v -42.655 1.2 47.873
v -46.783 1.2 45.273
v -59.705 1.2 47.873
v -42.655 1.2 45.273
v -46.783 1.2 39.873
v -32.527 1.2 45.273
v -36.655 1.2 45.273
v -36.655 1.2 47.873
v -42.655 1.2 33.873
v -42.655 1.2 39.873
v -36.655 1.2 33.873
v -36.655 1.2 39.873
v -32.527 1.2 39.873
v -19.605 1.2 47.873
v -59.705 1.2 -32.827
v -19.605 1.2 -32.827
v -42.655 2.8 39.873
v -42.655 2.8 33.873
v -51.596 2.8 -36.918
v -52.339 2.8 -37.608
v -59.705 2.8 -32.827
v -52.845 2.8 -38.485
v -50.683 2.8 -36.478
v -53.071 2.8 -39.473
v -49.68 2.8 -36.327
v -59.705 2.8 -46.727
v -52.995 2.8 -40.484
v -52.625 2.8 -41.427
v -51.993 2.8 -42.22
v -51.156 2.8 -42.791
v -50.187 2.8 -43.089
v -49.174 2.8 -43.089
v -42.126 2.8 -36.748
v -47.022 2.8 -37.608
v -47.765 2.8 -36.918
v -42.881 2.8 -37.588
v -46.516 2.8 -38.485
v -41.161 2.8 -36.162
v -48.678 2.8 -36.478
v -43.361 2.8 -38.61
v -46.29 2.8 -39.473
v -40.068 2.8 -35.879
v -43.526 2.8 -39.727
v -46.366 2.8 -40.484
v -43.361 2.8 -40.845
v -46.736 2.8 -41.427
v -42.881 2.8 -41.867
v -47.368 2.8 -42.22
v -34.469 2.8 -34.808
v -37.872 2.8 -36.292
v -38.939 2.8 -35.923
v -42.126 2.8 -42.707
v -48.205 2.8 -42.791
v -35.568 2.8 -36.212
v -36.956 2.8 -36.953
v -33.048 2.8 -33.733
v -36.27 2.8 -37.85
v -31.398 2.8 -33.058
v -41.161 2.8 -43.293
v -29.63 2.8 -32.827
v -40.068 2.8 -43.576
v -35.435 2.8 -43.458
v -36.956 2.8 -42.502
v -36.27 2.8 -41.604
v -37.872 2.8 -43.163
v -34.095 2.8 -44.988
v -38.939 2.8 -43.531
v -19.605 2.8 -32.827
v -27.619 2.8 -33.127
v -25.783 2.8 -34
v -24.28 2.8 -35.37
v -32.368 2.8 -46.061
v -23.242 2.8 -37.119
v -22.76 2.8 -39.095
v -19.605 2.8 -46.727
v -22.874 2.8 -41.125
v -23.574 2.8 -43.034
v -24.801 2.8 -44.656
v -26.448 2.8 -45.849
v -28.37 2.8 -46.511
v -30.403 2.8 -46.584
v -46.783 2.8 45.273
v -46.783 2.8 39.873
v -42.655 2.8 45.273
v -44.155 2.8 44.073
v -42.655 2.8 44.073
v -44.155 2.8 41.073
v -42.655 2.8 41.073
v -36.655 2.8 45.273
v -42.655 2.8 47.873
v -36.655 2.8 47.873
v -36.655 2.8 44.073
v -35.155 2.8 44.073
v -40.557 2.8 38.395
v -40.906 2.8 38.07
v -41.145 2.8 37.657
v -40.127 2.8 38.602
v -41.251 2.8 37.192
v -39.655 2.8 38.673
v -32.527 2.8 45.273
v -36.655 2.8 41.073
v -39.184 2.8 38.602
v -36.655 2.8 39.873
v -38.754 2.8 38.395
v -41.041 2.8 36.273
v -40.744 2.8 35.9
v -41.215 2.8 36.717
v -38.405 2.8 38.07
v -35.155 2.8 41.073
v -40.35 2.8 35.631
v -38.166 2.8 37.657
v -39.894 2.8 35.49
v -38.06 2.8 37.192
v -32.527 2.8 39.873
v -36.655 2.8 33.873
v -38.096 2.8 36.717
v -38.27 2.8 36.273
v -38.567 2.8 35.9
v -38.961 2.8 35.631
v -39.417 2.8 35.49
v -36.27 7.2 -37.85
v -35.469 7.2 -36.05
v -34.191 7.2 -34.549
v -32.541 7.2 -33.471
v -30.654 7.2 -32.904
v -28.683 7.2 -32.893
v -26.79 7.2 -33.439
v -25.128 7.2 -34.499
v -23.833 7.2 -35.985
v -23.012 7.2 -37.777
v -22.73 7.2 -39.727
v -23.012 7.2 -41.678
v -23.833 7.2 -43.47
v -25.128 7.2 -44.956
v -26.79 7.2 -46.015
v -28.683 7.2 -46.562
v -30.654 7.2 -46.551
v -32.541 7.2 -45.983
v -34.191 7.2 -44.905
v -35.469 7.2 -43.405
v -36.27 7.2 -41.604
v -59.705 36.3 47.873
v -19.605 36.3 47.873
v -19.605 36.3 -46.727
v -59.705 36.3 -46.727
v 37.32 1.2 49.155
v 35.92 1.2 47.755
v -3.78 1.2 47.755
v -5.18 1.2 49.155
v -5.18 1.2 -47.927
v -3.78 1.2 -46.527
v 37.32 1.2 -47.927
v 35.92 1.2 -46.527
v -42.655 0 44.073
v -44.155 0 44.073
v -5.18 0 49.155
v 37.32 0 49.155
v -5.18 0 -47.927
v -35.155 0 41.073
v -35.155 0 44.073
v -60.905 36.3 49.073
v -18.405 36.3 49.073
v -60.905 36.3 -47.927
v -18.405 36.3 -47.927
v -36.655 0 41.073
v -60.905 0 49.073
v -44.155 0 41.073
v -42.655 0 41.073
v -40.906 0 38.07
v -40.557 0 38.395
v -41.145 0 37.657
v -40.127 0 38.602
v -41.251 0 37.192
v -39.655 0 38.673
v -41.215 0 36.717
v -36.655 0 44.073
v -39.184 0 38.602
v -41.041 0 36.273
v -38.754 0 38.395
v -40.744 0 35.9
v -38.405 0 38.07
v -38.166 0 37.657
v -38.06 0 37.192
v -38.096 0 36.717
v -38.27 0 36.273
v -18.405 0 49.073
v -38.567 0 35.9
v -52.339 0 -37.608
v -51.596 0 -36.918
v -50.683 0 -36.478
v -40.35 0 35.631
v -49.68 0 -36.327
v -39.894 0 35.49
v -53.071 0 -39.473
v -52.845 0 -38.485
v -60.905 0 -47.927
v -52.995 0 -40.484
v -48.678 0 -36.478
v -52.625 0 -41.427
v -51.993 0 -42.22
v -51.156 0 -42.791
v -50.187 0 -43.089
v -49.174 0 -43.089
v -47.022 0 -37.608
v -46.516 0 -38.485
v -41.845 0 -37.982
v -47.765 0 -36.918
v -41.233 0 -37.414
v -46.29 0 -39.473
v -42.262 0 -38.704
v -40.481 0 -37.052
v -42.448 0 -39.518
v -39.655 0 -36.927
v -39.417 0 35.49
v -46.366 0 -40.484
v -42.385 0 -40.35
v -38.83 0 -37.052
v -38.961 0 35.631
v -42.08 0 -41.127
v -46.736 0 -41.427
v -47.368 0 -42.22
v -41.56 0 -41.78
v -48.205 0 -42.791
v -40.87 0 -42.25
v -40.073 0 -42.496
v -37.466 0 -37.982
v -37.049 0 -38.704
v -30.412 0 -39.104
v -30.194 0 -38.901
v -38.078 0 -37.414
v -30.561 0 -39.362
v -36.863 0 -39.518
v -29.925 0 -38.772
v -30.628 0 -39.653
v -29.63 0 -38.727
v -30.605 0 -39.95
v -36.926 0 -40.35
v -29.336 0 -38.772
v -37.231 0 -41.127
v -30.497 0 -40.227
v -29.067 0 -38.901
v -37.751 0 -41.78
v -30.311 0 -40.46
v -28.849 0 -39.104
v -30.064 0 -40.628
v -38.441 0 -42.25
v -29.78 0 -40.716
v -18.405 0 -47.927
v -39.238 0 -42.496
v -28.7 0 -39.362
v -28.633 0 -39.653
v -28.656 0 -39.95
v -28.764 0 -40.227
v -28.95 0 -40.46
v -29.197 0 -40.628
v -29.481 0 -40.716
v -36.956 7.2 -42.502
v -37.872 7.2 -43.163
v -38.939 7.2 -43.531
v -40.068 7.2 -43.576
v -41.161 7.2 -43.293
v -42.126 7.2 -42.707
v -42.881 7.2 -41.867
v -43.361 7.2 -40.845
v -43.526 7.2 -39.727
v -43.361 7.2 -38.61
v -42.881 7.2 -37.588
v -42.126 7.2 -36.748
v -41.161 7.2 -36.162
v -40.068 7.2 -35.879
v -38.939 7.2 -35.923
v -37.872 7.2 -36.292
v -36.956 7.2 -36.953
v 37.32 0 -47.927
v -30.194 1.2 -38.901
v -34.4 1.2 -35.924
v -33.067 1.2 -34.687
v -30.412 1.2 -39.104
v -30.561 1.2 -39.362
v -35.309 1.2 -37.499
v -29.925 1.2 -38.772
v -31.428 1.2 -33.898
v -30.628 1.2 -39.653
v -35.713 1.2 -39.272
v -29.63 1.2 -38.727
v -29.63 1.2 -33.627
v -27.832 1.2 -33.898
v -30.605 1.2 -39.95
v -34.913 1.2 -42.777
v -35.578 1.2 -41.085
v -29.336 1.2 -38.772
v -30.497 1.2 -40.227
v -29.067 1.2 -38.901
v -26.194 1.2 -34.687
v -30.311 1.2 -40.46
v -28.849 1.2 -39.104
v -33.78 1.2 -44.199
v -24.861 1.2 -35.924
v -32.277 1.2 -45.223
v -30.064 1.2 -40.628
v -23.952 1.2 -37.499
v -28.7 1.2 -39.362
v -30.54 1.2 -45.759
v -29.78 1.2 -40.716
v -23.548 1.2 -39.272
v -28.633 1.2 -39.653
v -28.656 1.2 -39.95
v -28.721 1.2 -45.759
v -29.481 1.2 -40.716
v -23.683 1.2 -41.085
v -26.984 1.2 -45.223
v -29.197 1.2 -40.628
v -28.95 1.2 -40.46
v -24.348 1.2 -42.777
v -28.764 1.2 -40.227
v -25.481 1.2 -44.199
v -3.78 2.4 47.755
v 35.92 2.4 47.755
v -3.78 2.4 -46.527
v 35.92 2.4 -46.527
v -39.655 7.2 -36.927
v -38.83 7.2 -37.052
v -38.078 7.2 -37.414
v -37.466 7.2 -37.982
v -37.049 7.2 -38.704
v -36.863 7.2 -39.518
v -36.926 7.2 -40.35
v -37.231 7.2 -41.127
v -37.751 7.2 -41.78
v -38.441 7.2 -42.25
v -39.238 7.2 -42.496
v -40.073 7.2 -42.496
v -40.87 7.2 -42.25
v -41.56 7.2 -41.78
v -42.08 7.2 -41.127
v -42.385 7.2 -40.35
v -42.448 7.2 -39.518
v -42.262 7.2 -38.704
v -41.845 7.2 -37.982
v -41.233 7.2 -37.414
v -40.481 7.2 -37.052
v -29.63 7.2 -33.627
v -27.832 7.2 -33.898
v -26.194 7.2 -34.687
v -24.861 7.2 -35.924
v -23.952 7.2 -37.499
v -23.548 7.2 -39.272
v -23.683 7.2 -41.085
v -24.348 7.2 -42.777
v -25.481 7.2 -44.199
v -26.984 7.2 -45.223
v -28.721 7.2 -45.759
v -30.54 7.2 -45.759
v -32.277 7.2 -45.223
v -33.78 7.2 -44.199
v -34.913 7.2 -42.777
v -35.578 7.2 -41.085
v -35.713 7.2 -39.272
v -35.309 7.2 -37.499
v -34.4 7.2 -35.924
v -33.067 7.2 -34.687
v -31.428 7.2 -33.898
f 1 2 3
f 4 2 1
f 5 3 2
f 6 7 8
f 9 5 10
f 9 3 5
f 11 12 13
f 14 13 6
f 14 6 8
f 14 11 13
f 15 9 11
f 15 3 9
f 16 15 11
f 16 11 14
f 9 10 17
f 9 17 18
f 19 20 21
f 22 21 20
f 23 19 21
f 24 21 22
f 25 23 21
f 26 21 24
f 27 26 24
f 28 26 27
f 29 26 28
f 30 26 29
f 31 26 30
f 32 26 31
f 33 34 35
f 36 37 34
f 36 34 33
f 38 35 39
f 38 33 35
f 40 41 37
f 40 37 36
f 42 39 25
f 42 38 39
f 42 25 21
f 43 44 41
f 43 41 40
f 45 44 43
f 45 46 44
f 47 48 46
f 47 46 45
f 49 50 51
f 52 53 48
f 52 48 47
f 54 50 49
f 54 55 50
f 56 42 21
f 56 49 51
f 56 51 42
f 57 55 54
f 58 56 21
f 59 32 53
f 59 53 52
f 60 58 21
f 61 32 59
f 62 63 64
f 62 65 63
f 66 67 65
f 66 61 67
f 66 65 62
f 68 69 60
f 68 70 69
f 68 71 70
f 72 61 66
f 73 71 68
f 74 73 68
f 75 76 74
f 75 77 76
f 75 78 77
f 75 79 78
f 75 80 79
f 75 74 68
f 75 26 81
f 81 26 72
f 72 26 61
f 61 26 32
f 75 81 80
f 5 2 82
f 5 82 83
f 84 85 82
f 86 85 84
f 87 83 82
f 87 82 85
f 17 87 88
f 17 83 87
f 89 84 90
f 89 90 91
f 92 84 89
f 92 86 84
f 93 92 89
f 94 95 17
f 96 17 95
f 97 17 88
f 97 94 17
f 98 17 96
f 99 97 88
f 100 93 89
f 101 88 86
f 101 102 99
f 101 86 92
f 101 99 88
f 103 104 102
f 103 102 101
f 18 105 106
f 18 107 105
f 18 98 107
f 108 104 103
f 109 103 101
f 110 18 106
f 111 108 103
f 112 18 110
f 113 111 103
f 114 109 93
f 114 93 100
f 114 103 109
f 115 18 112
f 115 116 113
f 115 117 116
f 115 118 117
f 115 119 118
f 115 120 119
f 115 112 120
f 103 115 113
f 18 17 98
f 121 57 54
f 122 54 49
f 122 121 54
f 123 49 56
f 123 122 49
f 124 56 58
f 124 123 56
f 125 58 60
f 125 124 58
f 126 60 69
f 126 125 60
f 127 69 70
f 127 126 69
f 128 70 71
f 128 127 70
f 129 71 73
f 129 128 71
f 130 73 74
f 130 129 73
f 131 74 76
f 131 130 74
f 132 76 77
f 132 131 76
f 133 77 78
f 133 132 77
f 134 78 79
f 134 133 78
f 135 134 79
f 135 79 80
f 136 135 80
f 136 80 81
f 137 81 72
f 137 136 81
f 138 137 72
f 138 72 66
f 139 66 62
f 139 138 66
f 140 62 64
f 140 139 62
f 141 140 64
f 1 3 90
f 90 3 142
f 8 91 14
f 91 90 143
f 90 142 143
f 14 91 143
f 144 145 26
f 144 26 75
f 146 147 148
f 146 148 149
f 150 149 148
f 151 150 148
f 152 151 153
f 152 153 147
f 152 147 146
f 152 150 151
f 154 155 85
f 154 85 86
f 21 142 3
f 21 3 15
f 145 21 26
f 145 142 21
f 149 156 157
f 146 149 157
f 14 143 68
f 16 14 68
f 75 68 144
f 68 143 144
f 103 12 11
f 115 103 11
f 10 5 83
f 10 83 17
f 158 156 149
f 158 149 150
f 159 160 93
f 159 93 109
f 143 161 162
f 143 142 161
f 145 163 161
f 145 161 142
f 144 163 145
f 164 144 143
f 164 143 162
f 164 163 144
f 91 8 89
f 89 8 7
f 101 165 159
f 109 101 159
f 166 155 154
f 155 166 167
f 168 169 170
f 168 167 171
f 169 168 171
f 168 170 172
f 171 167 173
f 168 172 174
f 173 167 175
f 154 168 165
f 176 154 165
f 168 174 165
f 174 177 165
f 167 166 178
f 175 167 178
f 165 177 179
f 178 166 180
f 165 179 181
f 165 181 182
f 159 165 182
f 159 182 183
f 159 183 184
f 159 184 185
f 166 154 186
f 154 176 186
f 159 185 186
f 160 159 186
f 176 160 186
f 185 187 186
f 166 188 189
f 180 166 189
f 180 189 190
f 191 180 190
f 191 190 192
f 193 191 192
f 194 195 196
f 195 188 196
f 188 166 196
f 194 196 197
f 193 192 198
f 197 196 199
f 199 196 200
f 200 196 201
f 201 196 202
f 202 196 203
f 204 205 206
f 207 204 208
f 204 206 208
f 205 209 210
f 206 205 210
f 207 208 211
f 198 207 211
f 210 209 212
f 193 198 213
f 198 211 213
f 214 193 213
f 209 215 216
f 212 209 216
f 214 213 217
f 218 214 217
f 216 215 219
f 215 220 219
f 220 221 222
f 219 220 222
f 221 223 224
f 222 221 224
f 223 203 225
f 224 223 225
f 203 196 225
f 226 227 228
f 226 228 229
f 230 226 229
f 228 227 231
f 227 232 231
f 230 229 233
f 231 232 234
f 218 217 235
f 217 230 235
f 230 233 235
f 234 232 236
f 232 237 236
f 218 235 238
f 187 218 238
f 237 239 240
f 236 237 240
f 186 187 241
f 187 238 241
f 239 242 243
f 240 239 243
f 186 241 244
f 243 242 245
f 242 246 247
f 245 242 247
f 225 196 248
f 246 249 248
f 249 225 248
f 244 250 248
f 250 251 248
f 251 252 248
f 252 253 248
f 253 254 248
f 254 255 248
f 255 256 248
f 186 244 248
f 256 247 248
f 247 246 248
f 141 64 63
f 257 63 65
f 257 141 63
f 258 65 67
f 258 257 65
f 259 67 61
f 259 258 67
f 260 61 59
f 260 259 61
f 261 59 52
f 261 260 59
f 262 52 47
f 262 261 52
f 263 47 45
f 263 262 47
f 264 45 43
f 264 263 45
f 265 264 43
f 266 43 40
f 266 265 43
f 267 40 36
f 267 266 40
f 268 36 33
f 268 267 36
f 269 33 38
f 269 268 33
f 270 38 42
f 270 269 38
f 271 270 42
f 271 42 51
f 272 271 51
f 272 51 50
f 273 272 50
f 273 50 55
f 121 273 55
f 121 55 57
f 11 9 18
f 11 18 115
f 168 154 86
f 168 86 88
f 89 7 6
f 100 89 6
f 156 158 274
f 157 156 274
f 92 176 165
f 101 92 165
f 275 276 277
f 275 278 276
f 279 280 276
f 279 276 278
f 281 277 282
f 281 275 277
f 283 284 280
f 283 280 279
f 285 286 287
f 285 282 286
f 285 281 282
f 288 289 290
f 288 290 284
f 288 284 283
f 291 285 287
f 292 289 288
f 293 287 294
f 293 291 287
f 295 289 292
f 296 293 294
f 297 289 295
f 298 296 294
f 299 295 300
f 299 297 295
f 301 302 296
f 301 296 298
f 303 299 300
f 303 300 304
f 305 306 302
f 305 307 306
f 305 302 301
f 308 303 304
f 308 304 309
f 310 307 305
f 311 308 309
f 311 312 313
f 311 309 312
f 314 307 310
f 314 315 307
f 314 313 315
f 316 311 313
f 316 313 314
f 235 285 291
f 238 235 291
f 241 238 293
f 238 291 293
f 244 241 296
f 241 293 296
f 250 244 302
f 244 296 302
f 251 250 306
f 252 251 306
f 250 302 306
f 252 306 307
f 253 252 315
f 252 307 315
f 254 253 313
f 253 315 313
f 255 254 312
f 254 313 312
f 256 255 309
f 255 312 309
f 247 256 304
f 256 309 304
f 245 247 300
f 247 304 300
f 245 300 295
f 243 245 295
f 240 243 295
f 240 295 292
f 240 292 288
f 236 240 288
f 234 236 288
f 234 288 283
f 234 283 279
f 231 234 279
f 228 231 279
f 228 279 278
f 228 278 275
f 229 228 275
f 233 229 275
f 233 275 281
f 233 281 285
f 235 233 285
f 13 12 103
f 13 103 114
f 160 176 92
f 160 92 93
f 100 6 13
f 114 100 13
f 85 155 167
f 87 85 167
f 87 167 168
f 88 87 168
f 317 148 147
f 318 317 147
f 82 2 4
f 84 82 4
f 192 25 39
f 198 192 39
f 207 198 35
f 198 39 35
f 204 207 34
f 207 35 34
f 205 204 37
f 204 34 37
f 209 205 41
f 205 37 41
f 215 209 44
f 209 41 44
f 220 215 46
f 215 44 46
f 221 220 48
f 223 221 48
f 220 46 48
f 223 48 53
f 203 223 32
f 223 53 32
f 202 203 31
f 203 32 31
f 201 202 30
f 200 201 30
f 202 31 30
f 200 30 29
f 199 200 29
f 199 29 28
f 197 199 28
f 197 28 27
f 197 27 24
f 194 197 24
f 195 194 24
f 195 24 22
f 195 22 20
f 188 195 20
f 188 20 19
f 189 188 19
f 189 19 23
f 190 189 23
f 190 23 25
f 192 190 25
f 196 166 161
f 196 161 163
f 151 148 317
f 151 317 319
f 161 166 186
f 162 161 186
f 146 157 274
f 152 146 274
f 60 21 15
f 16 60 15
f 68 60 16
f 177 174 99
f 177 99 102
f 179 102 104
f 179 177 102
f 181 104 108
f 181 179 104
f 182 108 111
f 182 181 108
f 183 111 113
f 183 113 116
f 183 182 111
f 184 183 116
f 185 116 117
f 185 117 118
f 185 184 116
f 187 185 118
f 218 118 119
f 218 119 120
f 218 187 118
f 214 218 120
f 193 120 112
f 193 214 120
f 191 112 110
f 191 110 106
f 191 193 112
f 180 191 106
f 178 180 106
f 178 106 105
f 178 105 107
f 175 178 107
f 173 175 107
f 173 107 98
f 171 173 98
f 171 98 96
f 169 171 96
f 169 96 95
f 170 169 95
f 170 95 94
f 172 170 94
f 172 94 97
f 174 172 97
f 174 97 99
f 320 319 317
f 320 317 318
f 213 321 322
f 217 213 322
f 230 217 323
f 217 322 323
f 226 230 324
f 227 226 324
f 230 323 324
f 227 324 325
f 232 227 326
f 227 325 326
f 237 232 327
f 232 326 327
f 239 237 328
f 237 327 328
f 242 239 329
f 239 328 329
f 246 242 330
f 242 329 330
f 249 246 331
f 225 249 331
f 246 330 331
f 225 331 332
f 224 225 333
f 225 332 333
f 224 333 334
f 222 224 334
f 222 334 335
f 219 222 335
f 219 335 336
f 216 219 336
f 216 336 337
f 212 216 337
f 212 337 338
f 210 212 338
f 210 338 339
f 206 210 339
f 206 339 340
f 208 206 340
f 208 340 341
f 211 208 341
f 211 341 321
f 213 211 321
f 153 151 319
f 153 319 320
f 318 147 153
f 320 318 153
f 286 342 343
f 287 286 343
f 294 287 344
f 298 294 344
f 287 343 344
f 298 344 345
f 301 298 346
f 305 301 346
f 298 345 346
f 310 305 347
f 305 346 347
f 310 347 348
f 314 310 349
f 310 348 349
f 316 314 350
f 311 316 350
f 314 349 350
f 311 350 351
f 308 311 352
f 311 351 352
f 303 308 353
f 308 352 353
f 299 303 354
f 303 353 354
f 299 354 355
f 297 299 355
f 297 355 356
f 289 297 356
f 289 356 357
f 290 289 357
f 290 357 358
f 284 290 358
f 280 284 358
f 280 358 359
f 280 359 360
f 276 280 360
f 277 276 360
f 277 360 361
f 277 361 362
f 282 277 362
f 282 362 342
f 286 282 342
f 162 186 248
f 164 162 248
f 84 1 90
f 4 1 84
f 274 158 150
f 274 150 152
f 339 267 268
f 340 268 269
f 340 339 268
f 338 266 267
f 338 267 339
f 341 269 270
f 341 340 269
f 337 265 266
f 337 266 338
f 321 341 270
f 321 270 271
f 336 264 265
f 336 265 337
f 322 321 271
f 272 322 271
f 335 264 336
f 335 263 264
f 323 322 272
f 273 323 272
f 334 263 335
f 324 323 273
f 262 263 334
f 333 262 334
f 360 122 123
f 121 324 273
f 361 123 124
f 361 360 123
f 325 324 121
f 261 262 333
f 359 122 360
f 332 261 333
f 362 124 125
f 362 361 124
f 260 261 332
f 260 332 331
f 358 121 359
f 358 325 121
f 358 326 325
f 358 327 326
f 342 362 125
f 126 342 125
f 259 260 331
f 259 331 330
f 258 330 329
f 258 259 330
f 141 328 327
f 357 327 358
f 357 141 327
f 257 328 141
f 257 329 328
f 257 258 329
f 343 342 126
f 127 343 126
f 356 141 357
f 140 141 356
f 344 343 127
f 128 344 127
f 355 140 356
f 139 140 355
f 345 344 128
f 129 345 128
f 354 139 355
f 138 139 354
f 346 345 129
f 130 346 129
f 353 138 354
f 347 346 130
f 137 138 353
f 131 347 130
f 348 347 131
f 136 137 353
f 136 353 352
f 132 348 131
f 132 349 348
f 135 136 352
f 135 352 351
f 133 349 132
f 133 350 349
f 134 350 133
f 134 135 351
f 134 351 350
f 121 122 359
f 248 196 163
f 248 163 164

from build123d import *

# Parameters (mm, degrees)
ESBO_O1_W                 = 42.5
ESBO_O1_H                 = 97
RESSALTO_EXTRUS_O2_DEPTH  = 36.3
ESBO_O2_W                 = 40.1
ESBO_O2_H                 = 94.6
CORTE_EXTRUS_O1_DEPTH     = 35.1
ESBO_O3_R                 = 3.4
ESBO_O3_R_2               = 1
ESBO_O3_R_3               = 2.8
CORTE_EXTRUS_O2_DEPTH     = 86.729869764
RESSALTO_EXTRUS_O6_START  = 1.6
ESBO_O5_W                 = 40.1
ESBO_O5_H                 = 13.9
ESBO_O5_R                 = 3.4
ESBO_O5_R_2               = 3.870741489
ESBO_O5_R_3               = 6.1
RESSALTO_EXTRUS_O6_DEPTH  = 1.6
RESSALTO_EXTRUS_O8_START  = 6
ESBO_O5_7_R               = 3.870741489
ESBO_O5_7_R_2             = 2.8
ESBO_O5_7_R_3             = 6.9
ESBO_O5_7_R_4             = 6.1
RESSALTO_EXTRUS_O8_DEPTH  = 6
ESBO_O6_W                 = 42.5
ESBO_O6_H                 = 97.082250683
RESSALTO_EXTRUS_O11_DEPTH = 1.2
ESBO_O6_4_W               = 39.7
ESBO_O6_4_H               = 94.282250683
RESSALTO_EXTRUS_O12_DEPTH = 1.2
ESBO_O6_5_W               = 39.7
ESBO_O6_5_H               = 94.282250683
RESSALTO_EXTRUS_O13_DEPTH = 2.4
ESBO_O1_8_R               = 1.6
ESBO_O1_8_W               = 1.5
ESBO_O1_8_H               = 3
CORTE_EXTRUS_O10_DEPTH    = 87.274966516
ESBO_O1_10_W              = 14.256
ESBO_O1_10_H              = 5.4
ESBO_O1_10_W_2            = 1.5
ESBO_O1_10_H_2            = 3
ESBO_O1_10_W_3            = 6
ESBO_O1_10_H_3            = 15.2
ESBO_O1_10_R              = 1.6
RESSALTO_EXTRUS_O14_DEPTH = 2.8


with BuildPart() as part:
    # Esboço1 → Ressalto-extrusão2 (new body)
    with BuildSketch(Plane(origin=(0, 0, 0), x_dir=(1, 0, 0), z_dir=(0, 1, 0))):
        with Locations((-39.655491882, -0.572615871)):
            Rectangle(ESBO_O1_W, ESBO_O1_H)
    extrude(amount=RESSALTO_EXTRUS_O2_DEPTH)

    # Esboço2 → Corte-extrusão1 (cut)
    with BuildSketch(Plane(origin=(0, 36.3, 0), x_dir=(1, 0, 0), z_dir=(0, 1, 0))):
        with Locations((-39.655491882, -0.572615871)):
            Rectangle(ESBO_O2_W, ESBO_O2_H)
    extrude(amount=-CORTE_EXTRUS_O1_DEPTH, mode=Mode.SUBTRACT)

    # Esboço3 → Corte-extrusão2 (cut, through all)
    with BuildSketch(Plane(origin=(0, 1.2, 0), x_dir=(1, 0, 0), z_dir=(0, 1, 0))):
        with Locations((-49.680491882, 39.727384129)):
            Circle(ESBO_O3_R)
        with Locations((-29.630491882, 39.727384129)):
            Circle(ESBO_O3_R_2)
        with Locations((-39.655491882, 39.727384129)):
            Circle(ESBO_O3_R_3)
    extrude(amount=-CORTE_EXTRUS_O2_DEPTH, mode=Mode.SUBTRACT)

    # Esboço5 → Ressalto-extrusão6 (add)
    with BuildSketch(Plane(origin=(0, 1.2, 0), x_dir=(1, 0, 0), z_dir=(0, 1, 0)).offset(RESSALTO_EXTRUS_O6_START)):
        with Locations((-39.655491882, 39.777384129)):
            Rectangle(ESBO_O5_W, ESBO_O5_H)
        with Locations((-49.680491882, 39.727384129)):
            Circle(ESBO_O5_R, mode=Mode.SUBTRACT)
        with Locations((-39.655491882, 39.727384129)):
            Circle(ESBO_O5_R_2, mode=Mode.SUBTRACT)
        with Locations((-29.630491882, 39.727384129)):
            Circle(ESBO_O5_R_3, mode=Mode.SUBTRACT)
    extrude(amount=-RESSALTO_EXTRUS_O6_DEPTH)

    # Esboço5<7> → Ressalto-extrusão8 (add)
    # profile 1 of 2: a face of its own
    with BuildSketch(Plane(origin=(0, 1.2, 0), x_dir=(1, 0, 0), z_dir=(0, 1, 0)).offset(RESSALTO_EXTRUS_O8_START)):
        with Locations((-39.655491882, 39.727384129)):
            Circle(ESBO_O5_7_R)
        with Locations((-39.655491882, 39.727384129)):
            Circle(ESBO_O5_7_R_2, mode=Mode.SUBTRACT)
    # profile 2 of 2: a face of its own
    with BuildSketch(Plane(origin=(0, 1.2, 0), x_dir=(1, 0, 0), z_dir=(0, 1, 0)).offset(RESSALTO_EXTRUS_O8_START)):
        with Locations((-29.630491882, 39.727384129)):
            Circle(ESBO_O5_7_R_3)
        with Locations((-29.630491882, 39.727384129)):
            Circle(ESBO_O5_7_R_4, mode=Mode.SUBTRACT)
    extrude(amount=-RESSALTO_EXTRUS_O8_DEPTH)

    # Esboço1<8> → Corte-extrusão10 (cut, through all)
    with BuildSketch(Plane(origin=(0, 0, 0), x_dir=(1, 0, 0), z_dir=(0, 1, 0))):
        with Locations((-39.655491882, -37.072615871)):
            Circle(ESBO_O1_8_R)
        with Locations((-43.405491882, -42.572615871)):
            Rectangle(ESBO_O1_8_W, ESBO_O1_8_H)
        with Locations((-35.905491882, -42.572615871)):
            Rectangle(ESBO_O1_8_W, ESBO_O1_8_H)
    extrude(amount=CORTE_EXTRUS_O10_DEPTH, mode=Mode.SUBTRACT)

    # Esboço1<10> → Ressalto-extrusão14 (add)
    # profile 1 of 2: a face of its own
    with BuildSketch(Plane(origin=(0, 0, 0), x_dir=(1, 0, 0), z_dir=(0, 1, 0))):
        with Locations((-39.655491882, -42.572615871)):
            Rectangle(ESBO_O1_10_W, ESBO_O1_10_H)
        with Locations((-43.405491882, -42.572615871)):
            Rectangle(ESBO_O1_10_W_2, ESBO_O1_10_H_2, mode=Mode.SUBTRACT)
        with Locations((-35.905491882, -42.572615871)):
            Rectangle(ESBO_O1_10_W_2, ESBO_O1_10_H_2, mode=Mode.SUBTRACT)
    # profile 2 of 2: a face of its own
    with BuildSketch(Plane(origin=(0, 0, 0), x_dir=(1, 0, 0), z_dir=(0, 1, 0))):
        with Locations((-39.655491882, -41.472615871)):
            Rectangle(ESBO_O1_10_W_3, ESBO_O1_10_H_3)
        with Locations((-39.655491882, -37.072615871)):
            Circle(ESBO_O1_10_R, mode=Mode.SUBTRACT)
    extrude(amount=RESSALTO_EXTRUS_O14_DEPTH)


with BuildPart() as body_2:
    # Esboço6 → Ressalto-extrusão11 (new body)
    with BuildSketch(Plane(origin=(0, 0, 0), x_dir=(1, 0, 0), z_dir=(0, 1, 0))):
        with Locations((16.069563731, -0.613741212)):
            Rectangle(ESBO_O6_W, ESBO_O6_H)
    extrude(amount=RESSALTO_EXTRUS_O11_DEPTH)

    # Esboço6<4> → Ressalto-extrusão12 (add)
    with BuildSketch(Plane(origin=(0, 0, 0), x_dir=(1, 0, 0), z_dir=(0, 1, 0))):
        with Locations((16.069563731, -0.613741212)):
            Rectangle(ESBO_O6_4_W, ESBO_O6_4_H)
    extrude(amount=RESSALTO_EXTRUS_O12_DEPTH)

    # Esboço6<5> → Ressalto-extrusão13 (add)
    with BuildSketch(Plane(origin=(0, 0, 0), x_dir=(1, 0, 0), z_dir=(0, 1, 0))):
        with Locations((16.069563731, -0.613741212)):
            Rectangle(ESBO_O6_5_W, ESBO_O6_5_H)
    extrude(amount=RESSALTO_EXTRUS_O13_DEPTH)


solid = Compound([part.part, body_2.part])
